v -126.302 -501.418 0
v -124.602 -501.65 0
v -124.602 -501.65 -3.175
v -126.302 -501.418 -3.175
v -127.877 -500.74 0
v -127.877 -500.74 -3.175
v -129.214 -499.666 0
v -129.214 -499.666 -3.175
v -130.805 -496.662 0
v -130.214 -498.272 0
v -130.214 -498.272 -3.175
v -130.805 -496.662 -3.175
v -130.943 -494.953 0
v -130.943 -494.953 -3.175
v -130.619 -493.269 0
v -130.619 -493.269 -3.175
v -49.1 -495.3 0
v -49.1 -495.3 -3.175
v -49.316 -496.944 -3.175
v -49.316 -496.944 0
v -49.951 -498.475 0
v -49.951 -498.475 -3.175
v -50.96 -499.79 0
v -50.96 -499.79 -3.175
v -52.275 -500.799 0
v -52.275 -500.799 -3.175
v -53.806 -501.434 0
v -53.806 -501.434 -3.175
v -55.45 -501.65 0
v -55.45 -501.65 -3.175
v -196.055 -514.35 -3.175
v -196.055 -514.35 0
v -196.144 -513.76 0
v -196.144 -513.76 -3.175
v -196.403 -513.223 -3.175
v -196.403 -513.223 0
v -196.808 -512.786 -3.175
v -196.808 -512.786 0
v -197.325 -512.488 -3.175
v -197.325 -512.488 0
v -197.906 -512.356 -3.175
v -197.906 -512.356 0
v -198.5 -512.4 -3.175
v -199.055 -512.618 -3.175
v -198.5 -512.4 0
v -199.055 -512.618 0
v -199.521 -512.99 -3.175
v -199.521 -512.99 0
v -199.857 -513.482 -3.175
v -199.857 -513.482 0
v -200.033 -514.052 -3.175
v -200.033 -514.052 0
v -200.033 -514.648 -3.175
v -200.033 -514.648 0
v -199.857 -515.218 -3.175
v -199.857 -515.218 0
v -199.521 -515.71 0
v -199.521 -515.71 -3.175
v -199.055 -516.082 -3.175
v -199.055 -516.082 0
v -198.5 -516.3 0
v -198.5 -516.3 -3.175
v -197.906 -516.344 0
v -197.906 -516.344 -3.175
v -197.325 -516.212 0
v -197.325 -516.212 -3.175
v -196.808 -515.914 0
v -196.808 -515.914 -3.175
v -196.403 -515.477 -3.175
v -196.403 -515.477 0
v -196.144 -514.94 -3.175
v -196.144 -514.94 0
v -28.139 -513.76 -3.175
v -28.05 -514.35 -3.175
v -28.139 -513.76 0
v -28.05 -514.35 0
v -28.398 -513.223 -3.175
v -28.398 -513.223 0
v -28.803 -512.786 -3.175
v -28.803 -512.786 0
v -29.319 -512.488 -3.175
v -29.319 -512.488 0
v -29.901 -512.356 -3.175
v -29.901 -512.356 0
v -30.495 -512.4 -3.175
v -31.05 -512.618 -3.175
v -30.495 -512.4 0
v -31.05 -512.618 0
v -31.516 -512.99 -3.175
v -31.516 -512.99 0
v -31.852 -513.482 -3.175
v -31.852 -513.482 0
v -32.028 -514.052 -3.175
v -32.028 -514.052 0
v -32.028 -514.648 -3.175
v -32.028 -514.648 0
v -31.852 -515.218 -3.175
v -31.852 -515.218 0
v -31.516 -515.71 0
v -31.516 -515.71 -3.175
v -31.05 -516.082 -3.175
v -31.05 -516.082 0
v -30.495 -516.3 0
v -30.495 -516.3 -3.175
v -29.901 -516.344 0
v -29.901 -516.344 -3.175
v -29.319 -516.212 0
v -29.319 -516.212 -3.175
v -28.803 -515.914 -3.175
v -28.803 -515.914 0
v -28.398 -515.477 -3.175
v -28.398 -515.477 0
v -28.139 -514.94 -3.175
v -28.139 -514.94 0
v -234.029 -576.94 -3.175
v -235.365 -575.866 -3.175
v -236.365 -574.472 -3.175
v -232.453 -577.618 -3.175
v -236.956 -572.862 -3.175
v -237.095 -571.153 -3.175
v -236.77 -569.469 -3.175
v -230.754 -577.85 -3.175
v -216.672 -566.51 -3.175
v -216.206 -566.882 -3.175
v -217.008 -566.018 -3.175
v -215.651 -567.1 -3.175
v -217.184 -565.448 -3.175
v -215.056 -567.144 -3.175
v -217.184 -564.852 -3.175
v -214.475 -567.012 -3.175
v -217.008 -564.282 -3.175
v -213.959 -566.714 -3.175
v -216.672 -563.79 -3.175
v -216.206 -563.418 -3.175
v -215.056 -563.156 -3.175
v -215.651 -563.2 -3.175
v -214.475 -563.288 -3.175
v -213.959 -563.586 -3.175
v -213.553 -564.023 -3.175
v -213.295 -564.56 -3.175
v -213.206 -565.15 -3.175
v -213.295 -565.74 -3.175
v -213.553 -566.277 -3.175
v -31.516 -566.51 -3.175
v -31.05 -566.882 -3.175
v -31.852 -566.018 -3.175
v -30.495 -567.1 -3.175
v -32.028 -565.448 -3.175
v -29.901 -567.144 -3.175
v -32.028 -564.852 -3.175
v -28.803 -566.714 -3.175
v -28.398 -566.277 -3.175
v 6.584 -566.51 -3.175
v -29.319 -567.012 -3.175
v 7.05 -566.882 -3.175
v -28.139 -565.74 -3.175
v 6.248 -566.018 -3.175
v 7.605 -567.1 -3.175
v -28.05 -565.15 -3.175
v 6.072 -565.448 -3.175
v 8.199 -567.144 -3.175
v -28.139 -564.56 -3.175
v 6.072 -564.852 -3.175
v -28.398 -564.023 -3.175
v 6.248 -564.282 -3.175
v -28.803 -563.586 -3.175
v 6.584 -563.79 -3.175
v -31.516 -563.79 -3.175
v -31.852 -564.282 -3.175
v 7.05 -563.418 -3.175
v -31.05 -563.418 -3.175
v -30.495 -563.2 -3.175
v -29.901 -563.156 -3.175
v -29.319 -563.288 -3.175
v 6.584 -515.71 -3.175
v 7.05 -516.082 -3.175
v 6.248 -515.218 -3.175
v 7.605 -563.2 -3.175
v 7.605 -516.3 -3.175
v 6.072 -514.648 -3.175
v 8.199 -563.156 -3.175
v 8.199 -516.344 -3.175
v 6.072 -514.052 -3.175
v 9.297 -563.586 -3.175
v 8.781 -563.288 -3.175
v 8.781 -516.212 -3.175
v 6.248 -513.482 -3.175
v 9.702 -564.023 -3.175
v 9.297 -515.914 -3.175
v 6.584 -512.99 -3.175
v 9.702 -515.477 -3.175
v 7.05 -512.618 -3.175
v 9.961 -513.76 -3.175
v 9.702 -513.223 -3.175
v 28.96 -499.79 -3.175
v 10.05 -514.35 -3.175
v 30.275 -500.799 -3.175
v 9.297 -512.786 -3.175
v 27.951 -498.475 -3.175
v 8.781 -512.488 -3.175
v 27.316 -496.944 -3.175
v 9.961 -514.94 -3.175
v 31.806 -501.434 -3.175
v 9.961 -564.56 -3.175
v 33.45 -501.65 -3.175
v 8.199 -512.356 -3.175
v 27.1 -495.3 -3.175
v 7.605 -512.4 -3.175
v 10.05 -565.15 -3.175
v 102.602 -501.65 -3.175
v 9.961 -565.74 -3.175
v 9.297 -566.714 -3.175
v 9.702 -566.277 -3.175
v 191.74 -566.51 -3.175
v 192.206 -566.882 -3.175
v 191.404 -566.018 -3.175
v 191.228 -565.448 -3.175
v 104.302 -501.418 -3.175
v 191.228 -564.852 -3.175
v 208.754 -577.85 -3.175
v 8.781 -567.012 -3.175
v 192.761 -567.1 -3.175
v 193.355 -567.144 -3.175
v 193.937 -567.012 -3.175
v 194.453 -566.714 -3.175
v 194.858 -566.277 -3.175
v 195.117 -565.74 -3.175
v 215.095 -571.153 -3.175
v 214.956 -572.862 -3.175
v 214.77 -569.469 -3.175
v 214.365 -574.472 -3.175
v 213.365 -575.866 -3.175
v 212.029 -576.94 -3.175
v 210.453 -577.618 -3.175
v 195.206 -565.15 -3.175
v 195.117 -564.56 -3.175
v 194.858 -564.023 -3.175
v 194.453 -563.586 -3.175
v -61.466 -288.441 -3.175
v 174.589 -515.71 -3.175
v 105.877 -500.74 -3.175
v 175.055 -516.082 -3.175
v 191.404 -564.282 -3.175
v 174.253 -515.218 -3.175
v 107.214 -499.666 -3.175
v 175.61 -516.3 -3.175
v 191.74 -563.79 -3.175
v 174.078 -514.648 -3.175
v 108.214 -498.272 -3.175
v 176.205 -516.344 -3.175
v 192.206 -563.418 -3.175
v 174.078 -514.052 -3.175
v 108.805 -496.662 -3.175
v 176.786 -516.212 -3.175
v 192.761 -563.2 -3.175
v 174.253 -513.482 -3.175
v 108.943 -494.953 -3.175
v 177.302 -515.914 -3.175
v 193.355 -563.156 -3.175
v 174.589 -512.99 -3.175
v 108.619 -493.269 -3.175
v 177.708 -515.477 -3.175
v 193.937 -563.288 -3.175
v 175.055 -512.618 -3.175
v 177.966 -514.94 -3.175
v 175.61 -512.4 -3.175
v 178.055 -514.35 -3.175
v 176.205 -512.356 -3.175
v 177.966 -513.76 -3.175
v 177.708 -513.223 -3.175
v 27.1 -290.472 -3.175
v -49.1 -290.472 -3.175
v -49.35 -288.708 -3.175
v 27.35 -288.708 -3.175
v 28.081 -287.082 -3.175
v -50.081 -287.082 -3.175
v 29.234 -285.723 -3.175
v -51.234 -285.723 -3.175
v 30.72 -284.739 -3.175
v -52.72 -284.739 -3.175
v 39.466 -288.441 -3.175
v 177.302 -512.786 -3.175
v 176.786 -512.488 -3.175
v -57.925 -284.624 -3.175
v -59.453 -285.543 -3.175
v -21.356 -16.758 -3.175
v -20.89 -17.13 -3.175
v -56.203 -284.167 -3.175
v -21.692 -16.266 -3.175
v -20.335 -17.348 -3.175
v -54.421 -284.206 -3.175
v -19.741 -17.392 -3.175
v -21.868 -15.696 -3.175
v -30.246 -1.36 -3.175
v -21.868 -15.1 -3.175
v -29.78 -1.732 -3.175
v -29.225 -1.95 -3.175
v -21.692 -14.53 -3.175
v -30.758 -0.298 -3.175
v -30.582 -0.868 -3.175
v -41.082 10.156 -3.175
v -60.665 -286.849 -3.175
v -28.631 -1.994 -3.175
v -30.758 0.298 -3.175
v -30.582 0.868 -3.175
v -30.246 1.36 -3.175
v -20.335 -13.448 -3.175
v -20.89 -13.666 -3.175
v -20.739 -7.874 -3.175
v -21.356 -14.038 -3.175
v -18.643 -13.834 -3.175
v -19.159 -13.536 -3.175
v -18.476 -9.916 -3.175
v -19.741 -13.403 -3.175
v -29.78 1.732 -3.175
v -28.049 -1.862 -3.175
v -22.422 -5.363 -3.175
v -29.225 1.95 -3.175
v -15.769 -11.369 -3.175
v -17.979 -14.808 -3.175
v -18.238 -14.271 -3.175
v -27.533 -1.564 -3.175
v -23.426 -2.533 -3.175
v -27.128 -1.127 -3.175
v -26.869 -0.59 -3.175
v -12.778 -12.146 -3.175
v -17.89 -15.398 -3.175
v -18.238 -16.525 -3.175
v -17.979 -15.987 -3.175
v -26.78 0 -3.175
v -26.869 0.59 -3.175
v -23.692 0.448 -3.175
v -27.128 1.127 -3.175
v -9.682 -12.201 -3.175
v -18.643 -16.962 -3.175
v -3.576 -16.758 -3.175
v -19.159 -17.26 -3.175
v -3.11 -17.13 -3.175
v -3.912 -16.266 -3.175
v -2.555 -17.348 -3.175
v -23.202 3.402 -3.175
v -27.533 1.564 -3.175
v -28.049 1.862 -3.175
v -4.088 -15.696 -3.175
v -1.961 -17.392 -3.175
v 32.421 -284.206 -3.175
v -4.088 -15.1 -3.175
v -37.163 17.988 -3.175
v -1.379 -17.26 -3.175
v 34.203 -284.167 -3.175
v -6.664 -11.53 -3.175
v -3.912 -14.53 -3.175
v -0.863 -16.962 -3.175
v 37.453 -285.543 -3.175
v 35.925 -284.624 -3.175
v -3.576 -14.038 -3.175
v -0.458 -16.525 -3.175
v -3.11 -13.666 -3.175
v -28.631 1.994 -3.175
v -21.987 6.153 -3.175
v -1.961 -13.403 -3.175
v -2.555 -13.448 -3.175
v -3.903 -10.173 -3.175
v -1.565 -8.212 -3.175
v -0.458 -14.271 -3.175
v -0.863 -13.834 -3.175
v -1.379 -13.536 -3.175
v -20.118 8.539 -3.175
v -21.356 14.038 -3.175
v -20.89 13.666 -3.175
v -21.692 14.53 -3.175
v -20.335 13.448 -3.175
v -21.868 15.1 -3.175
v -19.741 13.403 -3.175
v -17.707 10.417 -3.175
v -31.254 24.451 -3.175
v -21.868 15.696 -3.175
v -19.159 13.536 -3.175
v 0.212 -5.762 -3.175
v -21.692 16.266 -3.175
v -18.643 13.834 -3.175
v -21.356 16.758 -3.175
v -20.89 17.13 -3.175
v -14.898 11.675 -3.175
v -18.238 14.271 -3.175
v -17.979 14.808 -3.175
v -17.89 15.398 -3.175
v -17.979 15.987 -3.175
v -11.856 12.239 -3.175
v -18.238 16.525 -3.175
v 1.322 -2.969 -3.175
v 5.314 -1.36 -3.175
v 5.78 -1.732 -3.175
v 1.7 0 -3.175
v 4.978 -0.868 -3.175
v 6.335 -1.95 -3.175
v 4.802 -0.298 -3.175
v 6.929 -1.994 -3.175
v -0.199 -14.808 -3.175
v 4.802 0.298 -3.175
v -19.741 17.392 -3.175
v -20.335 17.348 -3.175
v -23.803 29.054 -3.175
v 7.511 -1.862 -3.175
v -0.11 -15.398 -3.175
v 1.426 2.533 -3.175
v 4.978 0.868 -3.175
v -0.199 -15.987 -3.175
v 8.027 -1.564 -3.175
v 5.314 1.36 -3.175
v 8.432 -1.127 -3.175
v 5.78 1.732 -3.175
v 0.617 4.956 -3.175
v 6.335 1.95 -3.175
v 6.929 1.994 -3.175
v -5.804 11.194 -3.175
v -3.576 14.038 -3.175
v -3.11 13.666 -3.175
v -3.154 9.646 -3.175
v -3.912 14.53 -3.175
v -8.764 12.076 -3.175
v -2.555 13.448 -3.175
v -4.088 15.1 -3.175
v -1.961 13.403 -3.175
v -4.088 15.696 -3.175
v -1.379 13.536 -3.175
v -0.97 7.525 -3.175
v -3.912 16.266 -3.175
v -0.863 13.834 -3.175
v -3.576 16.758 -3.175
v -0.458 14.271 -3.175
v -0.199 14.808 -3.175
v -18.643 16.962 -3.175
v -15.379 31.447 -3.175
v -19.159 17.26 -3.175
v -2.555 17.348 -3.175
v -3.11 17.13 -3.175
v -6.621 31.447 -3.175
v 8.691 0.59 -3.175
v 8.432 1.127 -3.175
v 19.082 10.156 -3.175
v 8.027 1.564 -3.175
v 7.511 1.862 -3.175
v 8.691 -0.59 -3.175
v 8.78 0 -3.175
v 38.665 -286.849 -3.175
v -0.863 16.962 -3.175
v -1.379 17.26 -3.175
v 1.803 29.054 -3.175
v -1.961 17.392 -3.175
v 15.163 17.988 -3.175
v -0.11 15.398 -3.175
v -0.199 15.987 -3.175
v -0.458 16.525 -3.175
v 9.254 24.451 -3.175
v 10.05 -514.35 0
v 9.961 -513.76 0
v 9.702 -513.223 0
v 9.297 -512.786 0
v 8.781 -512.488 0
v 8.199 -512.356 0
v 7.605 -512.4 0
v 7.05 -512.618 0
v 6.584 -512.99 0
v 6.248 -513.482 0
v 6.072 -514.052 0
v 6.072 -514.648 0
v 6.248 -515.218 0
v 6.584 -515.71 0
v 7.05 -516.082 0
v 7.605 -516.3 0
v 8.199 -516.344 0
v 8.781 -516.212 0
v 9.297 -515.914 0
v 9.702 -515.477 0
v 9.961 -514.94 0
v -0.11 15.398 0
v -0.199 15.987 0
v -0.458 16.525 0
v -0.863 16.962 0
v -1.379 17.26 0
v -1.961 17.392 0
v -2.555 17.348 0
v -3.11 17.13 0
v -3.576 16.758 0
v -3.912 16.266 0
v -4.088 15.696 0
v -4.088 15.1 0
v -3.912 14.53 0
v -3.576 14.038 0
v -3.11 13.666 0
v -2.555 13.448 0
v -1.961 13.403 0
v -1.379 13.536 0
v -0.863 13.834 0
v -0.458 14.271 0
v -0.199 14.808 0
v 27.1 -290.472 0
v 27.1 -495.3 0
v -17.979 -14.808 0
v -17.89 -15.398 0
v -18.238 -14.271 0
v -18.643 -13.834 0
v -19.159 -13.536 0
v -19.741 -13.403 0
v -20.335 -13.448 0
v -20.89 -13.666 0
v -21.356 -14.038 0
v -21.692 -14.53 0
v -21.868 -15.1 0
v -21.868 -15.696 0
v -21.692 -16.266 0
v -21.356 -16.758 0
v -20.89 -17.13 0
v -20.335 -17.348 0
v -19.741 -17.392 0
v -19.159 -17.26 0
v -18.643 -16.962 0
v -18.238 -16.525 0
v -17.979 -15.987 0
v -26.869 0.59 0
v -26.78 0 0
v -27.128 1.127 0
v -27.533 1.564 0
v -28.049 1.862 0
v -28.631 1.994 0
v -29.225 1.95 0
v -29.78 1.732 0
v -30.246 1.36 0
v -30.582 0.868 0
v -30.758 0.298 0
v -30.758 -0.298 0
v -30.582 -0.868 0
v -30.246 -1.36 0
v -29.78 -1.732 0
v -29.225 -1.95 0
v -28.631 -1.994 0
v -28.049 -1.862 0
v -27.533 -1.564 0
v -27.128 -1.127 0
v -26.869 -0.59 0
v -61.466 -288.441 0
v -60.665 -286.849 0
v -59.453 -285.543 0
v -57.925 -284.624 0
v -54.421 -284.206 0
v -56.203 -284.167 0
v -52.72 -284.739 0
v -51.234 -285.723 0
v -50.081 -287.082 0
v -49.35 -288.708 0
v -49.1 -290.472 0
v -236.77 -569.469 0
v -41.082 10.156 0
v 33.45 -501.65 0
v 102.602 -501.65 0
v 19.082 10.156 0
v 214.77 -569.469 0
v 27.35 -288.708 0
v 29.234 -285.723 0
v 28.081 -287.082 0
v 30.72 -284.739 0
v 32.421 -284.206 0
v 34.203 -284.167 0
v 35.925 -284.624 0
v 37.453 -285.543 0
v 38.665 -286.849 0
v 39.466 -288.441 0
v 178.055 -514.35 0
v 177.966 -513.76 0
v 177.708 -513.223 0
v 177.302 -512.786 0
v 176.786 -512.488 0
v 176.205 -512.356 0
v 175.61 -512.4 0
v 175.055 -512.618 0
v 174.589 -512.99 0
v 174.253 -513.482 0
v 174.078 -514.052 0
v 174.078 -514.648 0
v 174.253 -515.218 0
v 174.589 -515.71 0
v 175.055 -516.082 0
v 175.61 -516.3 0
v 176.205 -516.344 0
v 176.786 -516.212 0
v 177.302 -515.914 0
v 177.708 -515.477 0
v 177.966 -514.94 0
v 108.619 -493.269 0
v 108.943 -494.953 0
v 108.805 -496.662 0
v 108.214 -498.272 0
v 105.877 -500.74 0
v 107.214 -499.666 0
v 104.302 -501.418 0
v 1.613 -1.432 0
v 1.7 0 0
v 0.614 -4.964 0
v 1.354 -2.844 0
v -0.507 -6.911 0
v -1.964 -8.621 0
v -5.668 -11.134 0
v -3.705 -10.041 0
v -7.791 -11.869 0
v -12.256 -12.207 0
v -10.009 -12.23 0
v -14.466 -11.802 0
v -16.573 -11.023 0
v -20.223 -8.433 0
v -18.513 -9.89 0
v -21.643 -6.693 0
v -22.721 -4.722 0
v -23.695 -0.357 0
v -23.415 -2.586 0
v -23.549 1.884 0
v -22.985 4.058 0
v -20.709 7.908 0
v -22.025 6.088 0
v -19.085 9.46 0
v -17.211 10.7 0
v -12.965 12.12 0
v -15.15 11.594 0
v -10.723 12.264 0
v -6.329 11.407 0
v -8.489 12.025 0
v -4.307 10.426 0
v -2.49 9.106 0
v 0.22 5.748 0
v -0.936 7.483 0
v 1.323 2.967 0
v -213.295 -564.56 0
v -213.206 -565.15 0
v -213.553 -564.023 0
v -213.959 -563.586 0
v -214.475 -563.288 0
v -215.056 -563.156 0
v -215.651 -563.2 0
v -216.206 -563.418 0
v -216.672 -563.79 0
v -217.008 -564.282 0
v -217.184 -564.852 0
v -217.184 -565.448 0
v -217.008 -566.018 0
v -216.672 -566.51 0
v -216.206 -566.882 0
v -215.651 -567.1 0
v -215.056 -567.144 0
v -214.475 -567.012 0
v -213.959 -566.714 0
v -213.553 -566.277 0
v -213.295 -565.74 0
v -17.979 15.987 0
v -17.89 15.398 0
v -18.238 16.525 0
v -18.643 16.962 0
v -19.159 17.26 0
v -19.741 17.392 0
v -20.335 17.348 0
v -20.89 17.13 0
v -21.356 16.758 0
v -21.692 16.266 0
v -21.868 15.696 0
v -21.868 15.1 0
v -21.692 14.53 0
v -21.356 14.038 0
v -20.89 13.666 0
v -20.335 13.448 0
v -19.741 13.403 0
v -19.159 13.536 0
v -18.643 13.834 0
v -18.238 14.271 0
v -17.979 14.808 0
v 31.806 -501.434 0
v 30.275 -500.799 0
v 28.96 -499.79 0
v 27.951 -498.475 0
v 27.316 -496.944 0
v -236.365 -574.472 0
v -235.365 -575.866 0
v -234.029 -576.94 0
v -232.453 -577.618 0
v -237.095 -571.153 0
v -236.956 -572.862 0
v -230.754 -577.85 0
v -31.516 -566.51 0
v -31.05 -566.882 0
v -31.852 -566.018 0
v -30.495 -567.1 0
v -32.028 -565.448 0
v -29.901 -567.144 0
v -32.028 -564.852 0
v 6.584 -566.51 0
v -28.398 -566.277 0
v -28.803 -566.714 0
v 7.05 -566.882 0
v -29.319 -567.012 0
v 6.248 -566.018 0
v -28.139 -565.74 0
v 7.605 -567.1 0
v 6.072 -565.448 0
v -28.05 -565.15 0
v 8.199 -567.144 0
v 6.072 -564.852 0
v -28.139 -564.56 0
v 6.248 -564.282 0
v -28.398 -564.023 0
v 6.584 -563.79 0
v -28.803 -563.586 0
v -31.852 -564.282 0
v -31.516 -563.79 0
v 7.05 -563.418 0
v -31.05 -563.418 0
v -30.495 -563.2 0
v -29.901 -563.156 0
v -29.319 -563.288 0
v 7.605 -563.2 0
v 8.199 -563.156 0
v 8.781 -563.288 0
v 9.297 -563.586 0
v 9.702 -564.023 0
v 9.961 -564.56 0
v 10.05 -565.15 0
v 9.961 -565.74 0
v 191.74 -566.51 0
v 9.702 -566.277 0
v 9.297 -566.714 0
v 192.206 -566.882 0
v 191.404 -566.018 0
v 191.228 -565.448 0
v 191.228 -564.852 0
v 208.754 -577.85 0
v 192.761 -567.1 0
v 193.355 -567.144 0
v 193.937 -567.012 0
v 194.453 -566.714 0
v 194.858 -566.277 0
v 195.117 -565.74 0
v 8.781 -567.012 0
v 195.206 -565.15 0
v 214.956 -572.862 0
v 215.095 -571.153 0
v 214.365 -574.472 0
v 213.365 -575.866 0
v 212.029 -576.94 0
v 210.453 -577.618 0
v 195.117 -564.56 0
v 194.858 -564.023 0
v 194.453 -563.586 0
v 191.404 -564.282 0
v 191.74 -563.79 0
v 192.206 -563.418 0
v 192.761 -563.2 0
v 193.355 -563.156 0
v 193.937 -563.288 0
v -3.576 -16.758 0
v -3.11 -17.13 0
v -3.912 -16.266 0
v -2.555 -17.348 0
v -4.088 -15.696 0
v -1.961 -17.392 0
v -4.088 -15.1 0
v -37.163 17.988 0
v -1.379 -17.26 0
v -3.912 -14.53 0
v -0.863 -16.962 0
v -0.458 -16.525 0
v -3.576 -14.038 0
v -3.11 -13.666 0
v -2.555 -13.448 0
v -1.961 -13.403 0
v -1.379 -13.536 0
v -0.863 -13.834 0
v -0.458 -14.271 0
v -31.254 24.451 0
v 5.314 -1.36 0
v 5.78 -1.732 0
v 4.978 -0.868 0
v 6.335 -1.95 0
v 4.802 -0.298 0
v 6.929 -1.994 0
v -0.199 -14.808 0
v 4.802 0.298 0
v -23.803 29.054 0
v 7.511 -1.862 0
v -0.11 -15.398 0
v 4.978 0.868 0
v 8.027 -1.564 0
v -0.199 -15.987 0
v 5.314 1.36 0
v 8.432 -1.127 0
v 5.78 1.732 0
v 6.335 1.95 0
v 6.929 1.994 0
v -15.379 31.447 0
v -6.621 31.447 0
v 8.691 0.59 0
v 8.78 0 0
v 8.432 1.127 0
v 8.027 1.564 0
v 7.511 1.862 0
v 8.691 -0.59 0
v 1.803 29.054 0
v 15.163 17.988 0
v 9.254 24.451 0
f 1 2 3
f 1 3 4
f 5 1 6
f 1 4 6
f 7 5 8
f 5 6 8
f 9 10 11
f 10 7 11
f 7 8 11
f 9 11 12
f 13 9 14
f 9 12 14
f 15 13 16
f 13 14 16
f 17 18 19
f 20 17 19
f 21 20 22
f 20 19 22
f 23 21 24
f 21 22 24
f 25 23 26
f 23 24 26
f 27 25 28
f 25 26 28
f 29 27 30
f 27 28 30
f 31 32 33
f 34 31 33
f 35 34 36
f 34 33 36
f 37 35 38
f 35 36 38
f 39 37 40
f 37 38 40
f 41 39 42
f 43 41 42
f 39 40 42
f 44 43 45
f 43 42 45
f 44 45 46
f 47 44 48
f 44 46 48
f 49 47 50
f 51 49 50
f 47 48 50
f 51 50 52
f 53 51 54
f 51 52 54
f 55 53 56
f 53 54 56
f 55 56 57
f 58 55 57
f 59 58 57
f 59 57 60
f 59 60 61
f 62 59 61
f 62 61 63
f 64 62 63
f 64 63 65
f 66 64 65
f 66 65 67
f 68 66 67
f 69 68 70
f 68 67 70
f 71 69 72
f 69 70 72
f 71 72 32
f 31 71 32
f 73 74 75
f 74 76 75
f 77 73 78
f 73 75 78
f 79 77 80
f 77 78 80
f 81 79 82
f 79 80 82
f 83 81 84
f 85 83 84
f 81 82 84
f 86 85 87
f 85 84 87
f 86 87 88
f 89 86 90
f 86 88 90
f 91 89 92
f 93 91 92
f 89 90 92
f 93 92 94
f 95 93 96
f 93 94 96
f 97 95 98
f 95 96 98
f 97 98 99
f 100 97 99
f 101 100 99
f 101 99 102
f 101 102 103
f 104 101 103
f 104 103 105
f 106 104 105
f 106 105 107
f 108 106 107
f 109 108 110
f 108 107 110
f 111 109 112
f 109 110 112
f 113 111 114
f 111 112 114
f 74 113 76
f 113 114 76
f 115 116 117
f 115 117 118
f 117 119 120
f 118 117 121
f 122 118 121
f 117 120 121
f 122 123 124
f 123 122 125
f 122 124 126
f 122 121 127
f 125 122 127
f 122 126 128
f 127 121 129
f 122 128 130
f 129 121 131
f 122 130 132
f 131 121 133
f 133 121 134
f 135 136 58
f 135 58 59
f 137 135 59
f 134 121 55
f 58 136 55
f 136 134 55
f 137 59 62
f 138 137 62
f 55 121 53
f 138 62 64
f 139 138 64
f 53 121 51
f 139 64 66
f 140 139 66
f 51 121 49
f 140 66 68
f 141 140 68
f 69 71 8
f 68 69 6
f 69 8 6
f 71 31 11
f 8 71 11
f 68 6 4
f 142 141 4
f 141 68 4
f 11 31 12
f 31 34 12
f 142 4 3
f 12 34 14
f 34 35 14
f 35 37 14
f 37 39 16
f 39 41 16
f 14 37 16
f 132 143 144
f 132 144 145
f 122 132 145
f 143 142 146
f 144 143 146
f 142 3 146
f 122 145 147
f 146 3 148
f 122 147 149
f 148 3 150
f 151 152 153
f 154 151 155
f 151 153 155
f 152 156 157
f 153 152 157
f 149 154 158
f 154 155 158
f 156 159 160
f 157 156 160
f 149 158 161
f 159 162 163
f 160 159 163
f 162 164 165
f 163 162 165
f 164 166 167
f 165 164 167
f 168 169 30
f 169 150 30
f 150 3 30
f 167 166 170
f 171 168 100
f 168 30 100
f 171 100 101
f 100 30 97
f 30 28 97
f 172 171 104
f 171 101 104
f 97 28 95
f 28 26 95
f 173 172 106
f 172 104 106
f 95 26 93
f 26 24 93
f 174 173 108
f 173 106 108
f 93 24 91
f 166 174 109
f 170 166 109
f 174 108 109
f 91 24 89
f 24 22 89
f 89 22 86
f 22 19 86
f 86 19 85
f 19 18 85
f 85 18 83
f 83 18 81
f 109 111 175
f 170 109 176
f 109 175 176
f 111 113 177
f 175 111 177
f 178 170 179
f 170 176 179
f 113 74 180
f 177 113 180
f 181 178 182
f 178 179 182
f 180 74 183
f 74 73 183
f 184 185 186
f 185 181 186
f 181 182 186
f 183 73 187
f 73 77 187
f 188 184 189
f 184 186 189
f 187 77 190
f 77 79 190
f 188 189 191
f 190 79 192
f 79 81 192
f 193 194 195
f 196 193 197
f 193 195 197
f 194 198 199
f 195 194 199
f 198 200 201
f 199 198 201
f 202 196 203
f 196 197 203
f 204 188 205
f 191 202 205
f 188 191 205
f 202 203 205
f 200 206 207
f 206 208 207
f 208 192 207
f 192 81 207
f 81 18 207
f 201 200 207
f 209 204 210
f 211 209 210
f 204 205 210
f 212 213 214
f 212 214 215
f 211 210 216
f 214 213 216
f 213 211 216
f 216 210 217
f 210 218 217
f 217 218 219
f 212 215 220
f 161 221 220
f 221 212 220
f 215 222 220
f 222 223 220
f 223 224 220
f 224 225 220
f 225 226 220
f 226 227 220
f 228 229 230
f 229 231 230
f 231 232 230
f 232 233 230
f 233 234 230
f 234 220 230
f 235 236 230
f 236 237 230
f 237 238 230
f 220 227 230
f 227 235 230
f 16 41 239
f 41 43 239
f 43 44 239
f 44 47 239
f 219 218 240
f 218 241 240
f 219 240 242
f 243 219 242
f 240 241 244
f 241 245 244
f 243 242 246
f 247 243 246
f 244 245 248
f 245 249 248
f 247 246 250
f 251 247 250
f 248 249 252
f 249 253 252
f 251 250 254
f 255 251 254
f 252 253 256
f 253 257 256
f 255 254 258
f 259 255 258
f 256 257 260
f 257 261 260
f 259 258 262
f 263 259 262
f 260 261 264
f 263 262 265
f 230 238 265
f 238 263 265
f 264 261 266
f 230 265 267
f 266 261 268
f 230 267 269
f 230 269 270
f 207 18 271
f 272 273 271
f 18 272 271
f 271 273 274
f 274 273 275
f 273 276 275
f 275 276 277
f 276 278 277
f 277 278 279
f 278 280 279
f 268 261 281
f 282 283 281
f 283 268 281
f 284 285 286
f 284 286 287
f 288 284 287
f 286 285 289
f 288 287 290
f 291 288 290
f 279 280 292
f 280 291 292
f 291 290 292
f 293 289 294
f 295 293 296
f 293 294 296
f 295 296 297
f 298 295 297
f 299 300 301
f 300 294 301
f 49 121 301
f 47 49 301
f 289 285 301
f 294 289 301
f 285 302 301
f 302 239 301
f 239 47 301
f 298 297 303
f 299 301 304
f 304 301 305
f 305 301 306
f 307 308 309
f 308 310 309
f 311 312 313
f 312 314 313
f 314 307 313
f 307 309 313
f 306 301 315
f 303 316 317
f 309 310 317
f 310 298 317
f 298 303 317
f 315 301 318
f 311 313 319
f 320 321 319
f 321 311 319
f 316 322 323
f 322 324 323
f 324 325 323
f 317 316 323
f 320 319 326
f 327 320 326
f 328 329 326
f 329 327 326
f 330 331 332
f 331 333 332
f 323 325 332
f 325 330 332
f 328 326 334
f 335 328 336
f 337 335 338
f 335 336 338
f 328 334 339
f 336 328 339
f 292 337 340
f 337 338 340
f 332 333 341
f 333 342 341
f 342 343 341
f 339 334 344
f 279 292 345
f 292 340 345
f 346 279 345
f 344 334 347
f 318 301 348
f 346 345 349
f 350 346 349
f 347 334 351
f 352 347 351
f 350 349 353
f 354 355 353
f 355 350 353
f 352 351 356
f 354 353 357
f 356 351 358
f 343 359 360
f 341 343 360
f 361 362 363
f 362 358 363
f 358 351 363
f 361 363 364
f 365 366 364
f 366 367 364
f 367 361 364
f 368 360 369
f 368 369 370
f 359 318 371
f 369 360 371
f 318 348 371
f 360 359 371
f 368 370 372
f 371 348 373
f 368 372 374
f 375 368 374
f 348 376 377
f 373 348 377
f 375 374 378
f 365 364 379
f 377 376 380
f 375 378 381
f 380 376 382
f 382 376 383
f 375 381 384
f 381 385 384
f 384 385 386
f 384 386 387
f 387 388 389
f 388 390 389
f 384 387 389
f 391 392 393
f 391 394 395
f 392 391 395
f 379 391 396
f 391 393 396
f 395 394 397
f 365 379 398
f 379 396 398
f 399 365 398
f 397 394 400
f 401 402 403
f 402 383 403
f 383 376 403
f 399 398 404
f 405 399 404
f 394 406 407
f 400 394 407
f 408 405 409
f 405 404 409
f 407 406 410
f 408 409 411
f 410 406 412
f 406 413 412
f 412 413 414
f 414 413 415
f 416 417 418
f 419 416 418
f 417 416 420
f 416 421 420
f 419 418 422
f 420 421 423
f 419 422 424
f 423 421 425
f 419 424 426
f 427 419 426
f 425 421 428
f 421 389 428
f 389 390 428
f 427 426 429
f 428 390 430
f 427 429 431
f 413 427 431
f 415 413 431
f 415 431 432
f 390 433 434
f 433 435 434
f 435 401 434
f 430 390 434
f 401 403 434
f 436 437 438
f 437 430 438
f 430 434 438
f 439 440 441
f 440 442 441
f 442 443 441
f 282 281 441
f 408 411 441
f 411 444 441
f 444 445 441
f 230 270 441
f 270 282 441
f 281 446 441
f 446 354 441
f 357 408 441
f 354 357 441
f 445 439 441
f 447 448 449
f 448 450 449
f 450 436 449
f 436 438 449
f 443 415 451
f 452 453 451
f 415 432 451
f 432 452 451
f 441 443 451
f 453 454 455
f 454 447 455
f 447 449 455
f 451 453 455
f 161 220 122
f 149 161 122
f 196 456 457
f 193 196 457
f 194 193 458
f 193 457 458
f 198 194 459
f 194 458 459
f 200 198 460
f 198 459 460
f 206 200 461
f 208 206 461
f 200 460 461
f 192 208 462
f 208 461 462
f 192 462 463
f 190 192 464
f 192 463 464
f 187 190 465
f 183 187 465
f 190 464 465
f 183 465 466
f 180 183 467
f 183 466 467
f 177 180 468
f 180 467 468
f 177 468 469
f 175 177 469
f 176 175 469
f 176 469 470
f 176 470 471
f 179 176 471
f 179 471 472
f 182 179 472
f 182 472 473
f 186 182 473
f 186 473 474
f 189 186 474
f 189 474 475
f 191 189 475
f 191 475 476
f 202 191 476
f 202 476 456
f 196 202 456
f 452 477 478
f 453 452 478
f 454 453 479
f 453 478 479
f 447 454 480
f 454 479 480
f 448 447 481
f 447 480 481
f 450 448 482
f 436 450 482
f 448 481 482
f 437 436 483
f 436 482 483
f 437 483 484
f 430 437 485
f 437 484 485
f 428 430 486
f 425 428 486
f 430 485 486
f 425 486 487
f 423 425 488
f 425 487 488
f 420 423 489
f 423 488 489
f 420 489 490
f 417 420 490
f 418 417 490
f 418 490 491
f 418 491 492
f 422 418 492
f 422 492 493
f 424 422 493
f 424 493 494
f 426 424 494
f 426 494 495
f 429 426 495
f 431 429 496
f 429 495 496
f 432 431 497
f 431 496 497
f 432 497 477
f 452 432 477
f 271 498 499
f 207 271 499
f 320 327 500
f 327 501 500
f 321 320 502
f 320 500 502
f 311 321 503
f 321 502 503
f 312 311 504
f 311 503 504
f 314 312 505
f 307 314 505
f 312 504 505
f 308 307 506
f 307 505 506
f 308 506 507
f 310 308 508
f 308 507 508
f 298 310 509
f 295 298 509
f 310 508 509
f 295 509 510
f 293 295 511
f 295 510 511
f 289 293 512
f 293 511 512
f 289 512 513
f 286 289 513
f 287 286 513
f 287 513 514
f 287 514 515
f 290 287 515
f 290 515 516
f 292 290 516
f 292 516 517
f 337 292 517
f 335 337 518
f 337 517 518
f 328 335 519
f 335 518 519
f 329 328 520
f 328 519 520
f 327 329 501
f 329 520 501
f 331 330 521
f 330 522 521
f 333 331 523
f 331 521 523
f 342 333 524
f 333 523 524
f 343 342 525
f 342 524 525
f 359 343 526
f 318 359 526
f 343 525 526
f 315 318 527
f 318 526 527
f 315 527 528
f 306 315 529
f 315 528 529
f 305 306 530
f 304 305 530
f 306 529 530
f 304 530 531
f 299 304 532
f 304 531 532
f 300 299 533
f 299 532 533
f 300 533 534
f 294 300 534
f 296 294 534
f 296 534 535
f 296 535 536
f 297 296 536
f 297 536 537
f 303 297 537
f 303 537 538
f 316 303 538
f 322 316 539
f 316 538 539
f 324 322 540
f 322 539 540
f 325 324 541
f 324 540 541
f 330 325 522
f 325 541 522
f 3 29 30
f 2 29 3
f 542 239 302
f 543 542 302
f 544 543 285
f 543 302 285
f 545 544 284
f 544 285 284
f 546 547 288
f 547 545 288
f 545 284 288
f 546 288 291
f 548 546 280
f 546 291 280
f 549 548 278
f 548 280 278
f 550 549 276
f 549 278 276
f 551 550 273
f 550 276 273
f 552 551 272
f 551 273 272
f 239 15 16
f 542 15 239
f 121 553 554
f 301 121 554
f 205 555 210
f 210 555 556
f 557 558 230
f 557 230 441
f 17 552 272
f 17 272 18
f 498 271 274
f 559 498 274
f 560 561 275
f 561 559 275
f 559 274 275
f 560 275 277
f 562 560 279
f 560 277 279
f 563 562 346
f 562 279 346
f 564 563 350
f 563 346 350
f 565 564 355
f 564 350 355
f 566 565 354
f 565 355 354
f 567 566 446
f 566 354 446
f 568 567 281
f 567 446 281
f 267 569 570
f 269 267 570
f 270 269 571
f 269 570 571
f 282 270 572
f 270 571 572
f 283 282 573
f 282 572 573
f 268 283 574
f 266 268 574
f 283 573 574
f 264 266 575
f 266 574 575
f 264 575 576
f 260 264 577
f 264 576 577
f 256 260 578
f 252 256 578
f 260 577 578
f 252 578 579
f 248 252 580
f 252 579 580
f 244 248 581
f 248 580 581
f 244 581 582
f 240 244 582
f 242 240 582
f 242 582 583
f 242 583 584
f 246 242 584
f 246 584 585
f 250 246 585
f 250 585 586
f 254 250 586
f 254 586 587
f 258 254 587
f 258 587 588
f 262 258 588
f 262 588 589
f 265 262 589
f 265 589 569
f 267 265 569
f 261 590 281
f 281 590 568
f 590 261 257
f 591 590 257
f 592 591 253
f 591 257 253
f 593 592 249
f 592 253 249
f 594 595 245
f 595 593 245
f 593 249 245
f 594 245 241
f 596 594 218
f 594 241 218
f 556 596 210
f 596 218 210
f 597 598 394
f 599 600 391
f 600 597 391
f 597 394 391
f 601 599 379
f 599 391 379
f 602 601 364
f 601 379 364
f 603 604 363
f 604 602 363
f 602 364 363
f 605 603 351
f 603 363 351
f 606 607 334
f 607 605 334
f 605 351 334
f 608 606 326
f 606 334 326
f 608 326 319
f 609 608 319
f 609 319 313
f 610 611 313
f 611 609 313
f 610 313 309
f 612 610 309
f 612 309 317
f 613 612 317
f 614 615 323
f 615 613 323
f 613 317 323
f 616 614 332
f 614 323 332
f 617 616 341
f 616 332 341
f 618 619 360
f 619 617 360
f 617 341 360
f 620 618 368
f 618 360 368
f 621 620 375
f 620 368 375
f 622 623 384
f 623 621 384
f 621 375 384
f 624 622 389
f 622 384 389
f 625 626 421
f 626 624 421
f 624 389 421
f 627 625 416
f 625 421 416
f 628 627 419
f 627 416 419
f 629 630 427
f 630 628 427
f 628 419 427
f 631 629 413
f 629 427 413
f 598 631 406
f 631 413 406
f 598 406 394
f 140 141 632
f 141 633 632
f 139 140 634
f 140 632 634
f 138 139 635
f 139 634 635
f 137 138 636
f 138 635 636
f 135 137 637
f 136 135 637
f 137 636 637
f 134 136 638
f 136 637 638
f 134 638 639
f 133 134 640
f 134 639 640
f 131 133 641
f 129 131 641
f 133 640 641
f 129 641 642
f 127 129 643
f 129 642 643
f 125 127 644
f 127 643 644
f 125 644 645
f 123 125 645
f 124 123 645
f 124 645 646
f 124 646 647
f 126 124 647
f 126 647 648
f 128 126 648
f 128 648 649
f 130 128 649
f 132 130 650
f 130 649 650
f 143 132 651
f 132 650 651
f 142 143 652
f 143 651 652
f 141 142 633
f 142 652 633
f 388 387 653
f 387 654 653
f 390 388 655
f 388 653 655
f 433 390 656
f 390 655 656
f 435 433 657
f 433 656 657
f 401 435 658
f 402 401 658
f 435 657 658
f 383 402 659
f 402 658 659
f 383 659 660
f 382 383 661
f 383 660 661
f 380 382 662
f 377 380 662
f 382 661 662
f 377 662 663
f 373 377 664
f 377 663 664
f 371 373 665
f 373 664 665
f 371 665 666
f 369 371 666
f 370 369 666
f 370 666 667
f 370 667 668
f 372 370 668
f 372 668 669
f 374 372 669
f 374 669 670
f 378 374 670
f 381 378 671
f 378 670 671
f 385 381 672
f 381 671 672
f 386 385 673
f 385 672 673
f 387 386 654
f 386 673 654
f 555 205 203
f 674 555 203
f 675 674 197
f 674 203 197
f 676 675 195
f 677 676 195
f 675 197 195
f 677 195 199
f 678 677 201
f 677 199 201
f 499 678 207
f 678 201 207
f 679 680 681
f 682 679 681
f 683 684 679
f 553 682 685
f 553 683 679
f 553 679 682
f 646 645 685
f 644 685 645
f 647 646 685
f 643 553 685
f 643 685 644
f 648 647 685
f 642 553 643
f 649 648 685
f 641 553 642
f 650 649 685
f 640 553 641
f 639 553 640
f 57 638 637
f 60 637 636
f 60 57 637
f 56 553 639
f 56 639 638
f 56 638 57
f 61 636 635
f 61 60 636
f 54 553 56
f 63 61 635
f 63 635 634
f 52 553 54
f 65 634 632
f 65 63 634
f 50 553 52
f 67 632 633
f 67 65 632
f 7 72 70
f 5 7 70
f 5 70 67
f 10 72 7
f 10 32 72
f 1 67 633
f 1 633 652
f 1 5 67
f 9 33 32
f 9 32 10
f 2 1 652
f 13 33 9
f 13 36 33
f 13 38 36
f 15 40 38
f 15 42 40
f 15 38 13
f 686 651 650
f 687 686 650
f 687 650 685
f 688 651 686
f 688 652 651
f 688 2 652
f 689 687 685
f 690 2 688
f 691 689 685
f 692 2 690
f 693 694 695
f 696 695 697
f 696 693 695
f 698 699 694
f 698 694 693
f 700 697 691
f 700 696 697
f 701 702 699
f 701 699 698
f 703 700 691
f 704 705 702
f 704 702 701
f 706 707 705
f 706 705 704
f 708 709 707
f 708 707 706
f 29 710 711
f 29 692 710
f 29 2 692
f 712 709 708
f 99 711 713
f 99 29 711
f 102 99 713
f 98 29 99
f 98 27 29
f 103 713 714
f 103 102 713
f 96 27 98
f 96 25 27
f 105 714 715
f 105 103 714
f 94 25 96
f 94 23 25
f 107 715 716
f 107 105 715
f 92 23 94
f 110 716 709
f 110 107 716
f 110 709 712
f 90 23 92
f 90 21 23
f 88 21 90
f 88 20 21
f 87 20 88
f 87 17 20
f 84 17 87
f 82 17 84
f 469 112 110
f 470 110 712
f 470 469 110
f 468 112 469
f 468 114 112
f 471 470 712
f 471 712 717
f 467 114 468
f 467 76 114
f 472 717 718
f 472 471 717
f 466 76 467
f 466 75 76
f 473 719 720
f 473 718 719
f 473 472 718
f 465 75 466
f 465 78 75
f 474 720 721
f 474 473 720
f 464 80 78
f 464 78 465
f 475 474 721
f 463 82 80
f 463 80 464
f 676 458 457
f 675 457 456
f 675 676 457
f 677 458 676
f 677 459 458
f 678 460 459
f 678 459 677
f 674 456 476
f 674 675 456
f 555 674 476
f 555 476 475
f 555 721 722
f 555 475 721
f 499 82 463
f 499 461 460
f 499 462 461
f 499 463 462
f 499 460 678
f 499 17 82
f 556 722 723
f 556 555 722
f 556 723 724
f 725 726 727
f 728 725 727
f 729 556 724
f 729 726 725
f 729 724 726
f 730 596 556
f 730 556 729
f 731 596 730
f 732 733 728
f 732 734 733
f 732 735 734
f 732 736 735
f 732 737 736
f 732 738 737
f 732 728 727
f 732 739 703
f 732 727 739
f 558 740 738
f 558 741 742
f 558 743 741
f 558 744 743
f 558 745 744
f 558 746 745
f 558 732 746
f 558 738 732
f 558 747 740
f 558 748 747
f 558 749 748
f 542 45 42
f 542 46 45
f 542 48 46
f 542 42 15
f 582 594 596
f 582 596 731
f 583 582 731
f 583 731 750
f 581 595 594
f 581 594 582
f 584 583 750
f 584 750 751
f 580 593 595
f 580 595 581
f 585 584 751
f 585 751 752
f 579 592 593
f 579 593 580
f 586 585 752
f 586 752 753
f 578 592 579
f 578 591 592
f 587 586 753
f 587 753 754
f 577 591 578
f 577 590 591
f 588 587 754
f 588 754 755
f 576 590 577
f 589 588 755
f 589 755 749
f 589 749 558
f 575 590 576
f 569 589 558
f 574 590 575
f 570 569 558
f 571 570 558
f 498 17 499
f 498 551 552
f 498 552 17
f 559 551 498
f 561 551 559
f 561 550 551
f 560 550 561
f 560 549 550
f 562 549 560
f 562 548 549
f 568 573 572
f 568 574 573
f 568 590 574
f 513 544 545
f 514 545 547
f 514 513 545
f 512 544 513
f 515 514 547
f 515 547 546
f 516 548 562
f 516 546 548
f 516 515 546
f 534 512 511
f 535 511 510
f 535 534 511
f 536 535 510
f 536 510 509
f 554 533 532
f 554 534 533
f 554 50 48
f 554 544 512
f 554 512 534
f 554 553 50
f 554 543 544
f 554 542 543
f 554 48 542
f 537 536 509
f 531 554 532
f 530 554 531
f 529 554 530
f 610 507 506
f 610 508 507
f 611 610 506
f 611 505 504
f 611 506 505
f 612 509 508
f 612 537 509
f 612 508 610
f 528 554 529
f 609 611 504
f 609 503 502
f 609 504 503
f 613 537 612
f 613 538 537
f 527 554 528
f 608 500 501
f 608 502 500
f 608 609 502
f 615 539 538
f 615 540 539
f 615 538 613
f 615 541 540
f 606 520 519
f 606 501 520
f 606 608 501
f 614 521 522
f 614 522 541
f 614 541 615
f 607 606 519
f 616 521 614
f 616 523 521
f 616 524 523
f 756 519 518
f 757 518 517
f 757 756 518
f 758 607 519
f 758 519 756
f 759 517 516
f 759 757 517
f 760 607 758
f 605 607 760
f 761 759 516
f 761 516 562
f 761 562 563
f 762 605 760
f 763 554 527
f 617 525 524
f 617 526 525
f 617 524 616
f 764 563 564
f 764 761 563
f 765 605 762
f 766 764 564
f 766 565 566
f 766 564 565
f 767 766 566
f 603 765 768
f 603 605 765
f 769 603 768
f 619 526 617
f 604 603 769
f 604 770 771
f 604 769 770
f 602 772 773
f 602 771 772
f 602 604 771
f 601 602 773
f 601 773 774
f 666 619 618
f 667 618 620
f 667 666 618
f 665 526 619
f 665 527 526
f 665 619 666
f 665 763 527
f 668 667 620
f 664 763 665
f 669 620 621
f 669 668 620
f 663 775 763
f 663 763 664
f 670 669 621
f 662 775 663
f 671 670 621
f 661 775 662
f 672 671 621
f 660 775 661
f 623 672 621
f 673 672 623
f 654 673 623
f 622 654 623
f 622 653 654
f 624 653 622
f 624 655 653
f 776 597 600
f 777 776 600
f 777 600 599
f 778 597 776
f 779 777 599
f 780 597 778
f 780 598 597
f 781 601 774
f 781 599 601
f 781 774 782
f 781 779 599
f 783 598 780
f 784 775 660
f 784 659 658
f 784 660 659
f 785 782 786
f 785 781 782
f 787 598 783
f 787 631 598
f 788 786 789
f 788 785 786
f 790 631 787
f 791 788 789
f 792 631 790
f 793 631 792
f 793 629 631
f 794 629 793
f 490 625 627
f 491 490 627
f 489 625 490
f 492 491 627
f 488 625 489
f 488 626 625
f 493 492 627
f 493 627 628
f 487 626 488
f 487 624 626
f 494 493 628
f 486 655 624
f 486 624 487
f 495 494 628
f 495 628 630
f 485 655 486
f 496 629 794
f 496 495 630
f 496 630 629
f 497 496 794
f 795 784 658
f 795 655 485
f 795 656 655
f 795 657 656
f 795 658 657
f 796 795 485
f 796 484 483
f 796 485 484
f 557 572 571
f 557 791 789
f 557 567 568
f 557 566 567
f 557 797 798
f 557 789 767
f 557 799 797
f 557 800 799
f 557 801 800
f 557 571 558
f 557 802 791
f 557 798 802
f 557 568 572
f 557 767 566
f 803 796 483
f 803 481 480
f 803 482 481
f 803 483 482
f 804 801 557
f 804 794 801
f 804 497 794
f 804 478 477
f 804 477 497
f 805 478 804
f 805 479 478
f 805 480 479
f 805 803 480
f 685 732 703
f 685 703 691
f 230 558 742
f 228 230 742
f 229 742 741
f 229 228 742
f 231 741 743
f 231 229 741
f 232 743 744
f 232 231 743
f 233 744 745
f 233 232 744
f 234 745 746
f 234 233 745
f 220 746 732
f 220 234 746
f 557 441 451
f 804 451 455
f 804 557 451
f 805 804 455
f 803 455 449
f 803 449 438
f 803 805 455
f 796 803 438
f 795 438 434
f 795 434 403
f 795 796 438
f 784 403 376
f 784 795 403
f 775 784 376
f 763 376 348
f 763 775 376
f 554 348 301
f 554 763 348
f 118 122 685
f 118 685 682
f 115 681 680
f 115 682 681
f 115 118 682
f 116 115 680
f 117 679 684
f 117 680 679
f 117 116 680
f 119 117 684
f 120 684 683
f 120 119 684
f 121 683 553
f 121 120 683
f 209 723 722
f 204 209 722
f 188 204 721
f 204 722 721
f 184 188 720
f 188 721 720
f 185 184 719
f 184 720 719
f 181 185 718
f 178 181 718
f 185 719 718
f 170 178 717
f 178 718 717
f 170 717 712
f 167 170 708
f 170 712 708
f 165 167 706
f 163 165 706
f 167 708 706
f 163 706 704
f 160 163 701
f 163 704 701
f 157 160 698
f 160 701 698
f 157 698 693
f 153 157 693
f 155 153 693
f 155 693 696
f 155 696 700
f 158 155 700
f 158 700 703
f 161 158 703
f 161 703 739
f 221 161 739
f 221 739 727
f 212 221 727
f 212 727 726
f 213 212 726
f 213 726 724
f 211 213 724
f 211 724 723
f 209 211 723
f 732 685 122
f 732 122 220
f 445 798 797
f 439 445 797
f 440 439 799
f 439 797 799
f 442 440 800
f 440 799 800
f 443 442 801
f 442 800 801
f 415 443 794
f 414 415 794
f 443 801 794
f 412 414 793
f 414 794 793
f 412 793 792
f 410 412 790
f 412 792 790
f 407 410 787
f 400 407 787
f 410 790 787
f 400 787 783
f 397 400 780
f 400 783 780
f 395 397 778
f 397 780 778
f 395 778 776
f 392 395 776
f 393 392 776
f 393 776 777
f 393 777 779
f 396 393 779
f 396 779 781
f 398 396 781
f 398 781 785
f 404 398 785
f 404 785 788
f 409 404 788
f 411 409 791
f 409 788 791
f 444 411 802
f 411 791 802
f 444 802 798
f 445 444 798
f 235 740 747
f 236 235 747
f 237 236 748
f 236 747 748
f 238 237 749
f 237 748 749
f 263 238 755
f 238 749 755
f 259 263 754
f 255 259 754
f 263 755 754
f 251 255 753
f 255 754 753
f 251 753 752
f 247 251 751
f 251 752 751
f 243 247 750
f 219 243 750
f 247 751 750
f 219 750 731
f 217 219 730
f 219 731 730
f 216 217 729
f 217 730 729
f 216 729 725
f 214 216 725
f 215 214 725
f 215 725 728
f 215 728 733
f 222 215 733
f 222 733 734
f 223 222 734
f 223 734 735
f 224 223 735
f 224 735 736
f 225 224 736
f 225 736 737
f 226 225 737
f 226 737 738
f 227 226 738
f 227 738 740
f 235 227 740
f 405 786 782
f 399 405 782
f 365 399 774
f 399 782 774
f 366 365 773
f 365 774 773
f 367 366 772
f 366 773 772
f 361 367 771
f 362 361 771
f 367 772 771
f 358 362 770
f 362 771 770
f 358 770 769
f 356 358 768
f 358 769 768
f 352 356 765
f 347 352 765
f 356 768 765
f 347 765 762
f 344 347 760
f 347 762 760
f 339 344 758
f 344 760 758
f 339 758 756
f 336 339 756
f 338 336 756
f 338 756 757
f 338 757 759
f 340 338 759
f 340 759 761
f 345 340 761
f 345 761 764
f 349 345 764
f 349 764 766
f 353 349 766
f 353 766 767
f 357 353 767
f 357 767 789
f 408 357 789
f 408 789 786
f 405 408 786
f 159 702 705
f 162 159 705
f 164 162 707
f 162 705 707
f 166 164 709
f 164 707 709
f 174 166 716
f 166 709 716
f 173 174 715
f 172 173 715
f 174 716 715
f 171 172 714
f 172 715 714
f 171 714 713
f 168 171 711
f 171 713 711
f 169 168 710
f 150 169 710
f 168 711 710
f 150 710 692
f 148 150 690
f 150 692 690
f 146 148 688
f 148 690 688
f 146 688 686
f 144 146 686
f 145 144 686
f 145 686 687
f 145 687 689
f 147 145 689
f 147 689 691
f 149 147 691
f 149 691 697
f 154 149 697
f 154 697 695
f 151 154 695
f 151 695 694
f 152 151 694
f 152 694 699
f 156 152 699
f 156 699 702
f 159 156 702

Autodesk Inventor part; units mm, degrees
ref_plane "YZ Plane" through (0, 0, 0) normal (1, 0, 0) x (0, 1, 0)
ref_plane "XZ Plane" through (0, 0, 0) normal (0, 1, 0) x (-1, 0, 0)
ref_plane "XY Plane" through (0, 0, 0) normal (0, 0, 1) x (1, 0, 0)
sketch "Sketch1" plane through (0, 0, 0) normal (0, 0, 1) x (1, 0, 0)
  circle A0 centre (-11, 0) radius 11 projected
  circle A1 centre (-11, 0) radius 31.75
  line L0 (217.6, 31.75) -> (-239.6, 31.75)
  line L1 (-239.6, 31.75) -> (-239.6, -577.85)
  line L2 (-239.6, -577.85) -> (217.6, -577.85)
  line L3 (217.6, -577.85) -> (217.6, 31.75)
  line L4 (217.6, -577.85) -> (19.0819, 10.156)
  line L5 (-239.6, -577.85) -> (-41.0819, 10.156)
  line L6 (27.1, -501.65) -> (111.4484, -501.65)
  line L7 (111.4484, -501.65) -> (27.1, -251.8121)
  line L8 (27.1, -251.8121) -> (27.1, -501.65)
  line L9 (-11, 0) -> (-11, -6.454)
  line L10 (-49.1, -501.65) -> (-133.4484, -501.65)
  line L11 (-133.4484, -501.65) -> (-49.1, -251.8121)
  line L12 (-49.1, -251.8121) -> (-49.1, -501.65)
  circle A2 centre (193.2059, -565.15) radius 2
  circle A3 centre (176.0552, -514.35) radius 2
  circle A4 centre (8.05, -514.35) radius 2
  circle A5 centre (8.05, -565.15) radius 2
  circle A6 centre (-215.2059, -565.15) radius 2
  circle A7 centre (-198.0552, -514.35) radius 2
  circle A8 centre (-30.05, -514.35) radius 2
  circle A9 centre (-30.05, -565.15) radius 2
  circle A10 centre (-28.78, 0) radius 2
  circle A11 centre (-19.89, -15.3979) radius 2
  circle A12 centre (-2.11, -15.3979) radius 2
  circle A13 centre (6.78, 0) radius 2
  circle A14 centre (-2.11, 15.3979) radius 2
  circle A15 centre (-19.89, 15.3979) radius 2
  point P0 (0, 0)
  point P1 (-11, 31.75)
  point P2 (-11, -3.227)
  dimension "d0" = 63.5
  dimension "d1" = 457.2
  dimension "d2" = 609.6
  dimension "d3" = 76.2
  dimension "d4" = 76.2
  dimension "d5" = 38.1
  dimension "d6" = 4
  dimension "d7" = 4
  dimension "d8" = 4
  dimension "d9" = 4
  dimension "d10" = 12.7
  dimension "d11" = 12.7
  dimension "d12" = 19.05
  dimension "d13" = 19.05
  dimension "d14" = 19.05
  dimension "d15" = 4
  dimension "d16" = 17.78
  dimension "d19" = 360
extrude "Extrusion1" add sketch "Sketch1" against normal blind 3.175 contours A1 | A1 L4 L2 L5
fillet "Fillet1" radius 6.35 8 edges at (27.1, -251.8121, -1.5875) (-49.1, -251.8121, -1.5875) (111.4484, -501.65, -1.5875) (217.6, -577.85, -1.5875) (27.1, -501.65, -1.5875) (-49.1, -501.65, -1.5875) (-133.4484, -501.65, -1.5875) (-239.6, -577.85, -1.5875)
ref_plane "Work Plane1" through (-28.78, 0, -3.175) normal (0, 0.2588, -0.9659) x (1, 0, 0)
sketch "Sketch2" plane through (-28.78, 0, -3.175) normal (0, 0.2588, -0.9659) x (1, 0, 0)
  ellipse E0 centre (17.78, 0) end of major axis (6.7038, 0) minor radius 10.6988
  circle A0 centre (17.78, 0) radius 12.7
  dimension "d26" = 25.4
sketch "Sketch3" plane through (0, 0, -3.175) normal (0, 0, -1) x (-1, 0, 0)
  ellipse E0 centre (11, 0) end of major axis (-1.7, 0) minor radius 12.2673 projected
  point P0 (0, 0)
extrude "Extrusion2" cut sketch "Sketch3" against normal through all
properties part number "FrameTop" material "MDF Medium Density Fiberboard"
